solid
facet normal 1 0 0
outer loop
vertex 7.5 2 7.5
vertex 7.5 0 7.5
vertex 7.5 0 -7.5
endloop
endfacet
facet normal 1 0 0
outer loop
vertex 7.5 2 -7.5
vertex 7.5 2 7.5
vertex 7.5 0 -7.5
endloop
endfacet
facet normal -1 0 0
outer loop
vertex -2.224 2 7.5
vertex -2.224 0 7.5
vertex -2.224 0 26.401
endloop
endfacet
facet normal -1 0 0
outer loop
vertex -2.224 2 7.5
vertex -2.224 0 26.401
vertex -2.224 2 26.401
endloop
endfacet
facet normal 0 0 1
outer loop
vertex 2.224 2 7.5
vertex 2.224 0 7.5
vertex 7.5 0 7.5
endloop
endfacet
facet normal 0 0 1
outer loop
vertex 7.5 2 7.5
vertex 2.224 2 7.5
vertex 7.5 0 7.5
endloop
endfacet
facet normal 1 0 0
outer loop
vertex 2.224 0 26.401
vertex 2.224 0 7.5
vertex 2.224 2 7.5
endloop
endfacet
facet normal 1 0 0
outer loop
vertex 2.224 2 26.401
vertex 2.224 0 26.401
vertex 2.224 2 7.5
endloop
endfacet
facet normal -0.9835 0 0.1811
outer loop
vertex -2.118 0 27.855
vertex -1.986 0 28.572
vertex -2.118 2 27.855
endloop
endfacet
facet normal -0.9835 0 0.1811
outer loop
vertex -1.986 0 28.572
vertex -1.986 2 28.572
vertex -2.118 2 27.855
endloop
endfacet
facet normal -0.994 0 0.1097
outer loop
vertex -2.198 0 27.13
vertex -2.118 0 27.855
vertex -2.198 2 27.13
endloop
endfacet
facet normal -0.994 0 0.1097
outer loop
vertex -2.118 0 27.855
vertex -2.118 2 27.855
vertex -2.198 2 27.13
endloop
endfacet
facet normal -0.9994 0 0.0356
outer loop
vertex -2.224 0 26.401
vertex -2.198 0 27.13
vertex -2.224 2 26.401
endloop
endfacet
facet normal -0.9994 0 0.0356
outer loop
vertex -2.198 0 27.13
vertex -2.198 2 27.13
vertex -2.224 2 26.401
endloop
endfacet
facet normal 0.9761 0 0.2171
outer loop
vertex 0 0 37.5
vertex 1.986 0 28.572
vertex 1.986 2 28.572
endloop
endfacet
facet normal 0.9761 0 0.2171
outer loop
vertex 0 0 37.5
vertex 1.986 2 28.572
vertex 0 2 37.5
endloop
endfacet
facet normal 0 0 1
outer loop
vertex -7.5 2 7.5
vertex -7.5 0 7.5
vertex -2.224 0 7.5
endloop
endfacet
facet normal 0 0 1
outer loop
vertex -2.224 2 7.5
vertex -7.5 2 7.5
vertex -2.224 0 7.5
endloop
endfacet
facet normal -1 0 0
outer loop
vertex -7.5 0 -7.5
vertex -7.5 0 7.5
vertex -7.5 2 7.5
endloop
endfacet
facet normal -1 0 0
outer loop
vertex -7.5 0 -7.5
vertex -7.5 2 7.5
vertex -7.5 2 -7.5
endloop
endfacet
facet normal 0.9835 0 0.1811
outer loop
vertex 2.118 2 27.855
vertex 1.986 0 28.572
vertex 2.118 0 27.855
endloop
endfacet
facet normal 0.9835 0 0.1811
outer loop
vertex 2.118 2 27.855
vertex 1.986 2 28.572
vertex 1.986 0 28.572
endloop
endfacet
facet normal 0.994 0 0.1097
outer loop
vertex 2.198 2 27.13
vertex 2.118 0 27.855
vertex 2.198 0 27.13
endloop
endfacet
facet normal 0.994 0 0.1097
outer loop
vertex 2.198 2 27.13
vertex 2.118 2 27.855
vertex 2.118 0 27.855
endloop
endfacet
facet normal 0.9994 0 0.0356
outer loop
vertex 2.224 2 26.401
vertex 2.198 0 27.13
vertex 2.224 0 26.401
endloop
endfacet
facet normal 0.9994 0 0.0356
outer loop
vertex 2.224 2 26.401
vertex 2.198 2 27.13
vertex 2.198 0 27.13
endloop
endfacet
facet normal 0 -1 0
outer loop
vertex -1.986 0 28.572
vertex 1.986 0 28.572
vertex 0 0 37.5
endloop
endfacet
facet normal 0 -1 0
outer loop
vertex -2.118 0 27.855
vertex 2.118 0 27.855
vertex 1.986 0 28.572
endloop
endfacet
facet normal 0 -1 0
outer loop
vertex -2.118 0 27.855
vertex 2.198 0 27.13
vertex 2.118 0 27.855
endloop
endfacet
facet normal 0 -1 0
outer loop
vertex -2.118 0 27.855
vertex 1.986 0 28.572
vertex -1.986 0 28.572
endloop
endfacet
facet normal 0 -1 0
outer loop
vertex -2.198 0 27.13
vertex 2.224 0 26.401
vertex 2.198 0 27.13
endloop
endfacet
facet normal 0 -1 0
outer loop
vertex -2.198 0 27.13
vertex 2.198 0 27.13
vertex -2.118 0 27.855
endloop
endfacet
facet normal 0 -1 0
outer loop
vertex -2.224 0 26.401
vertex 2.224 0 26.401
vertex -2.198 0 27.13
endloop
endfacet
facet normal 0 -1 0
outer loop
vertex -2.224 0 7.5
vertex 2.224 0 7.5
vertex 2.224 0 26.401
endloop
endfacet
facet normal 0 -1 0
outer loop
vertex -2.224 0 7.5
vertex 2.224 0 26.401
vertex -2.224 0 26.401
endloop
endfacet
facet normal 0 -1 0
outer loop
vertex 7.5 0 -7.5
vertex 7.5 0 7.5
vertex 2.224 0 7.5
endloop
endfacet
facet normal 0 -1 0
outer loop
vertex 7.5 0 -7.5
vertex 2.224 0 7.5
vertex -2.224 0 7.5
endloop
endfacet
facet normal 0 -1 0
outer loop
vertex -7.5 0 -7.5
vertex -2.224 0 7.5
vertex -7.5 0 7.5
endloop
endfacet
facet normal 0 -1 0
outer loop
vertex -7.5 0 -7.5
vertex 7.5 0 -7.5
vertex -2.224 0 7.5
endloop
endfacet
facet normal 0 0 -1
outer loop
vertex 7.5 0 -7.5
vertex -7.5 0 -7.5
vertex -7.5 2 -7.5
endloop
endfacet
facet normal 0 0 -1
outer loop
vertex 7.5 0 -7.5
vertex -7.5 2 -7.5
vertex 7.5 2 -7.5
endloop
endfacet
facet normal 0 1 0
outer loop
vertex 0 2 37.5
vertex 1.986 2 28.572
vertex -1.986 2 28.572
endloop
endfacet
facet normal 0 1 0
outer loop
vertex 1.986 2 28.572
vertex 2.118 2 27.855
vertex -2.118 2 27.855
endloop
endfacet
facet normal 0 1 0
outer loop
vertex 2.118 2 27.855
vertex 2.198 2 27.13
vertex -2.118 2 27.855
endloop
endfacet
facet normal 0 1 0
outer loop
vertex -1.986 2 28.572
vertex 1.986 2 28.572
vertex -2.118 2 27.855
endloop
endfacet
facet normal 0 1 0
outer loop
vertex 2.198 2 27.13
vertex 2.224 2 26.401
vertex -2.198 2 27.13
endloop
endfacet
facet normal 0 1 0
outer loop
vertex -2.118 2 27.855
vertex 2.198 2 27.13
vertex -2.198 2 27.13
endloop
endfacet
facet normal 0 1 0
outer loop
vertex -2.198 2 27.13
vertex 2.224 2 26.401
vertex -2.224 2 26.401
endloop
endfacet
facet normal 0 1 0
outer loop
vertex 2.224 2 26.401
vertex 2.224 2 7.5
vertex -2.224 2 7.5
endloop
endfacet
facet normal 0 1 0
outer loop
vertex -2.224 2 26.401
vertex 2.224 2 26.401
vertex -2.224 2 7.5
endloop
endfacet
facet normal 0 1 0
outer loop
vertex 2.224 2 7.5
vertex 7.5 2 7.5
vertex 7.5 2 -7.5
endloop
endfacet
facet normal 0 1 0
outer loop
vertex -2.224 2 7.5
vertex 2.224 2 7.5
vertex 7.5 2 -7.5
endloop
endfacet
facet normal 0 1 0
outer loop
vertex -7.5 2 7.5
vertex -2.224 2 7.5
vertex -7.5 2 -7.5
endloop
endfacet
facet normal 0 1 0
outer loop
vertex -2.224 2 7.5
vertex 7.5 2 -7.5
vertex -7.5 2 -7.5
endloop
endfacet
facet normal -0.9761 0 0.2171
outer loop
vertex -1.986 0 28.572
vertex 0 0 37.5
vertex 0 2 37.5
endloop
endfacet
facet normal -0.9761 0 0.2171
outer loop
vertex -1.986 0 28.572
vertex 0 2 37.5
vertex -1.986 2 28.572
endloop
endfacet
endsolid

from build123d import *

# Parameters (mm, degrees)
IZIM1_W                     = 15
IZIM1_H                     = 15
Y_KSEKLIK_EKSTR_ZYON1_DEPTH = 2
IZIM2_W                     = 2.224225473
IZIM2_H                     = 2
Y_KSEKLIK_EKSTR_ZYON2_DEPTH = 20
Y_KSEKLIK_EKSTR_ZYON3_DEPTH = 2
RADYUS1_R                   = 10
RADYUS2_R                   = 10


with BuildPart() as part:
    # Çizim1 → Yükseklik-Ekstrüzyon1 (new body)
    with BuildSketch(Plane(origin=(0, 0, 0), x_dir=(1, 0, 0), z_dir=(0, 1, 0))):
        Rectangle(IZIM1_W, IZIM1_H)
    extrude(amount=Y_KSEKLIK_EKSTR_ZYON1_DEPTH)

    # Çizim2 → Yükseklik-Ekstrüzyon2 (add)
    with BuildSketch(Plane.XY.offset(7.5)):
        with Locations((1.112112737, 1)):
            Rectangle(IZIM2_W, IZIM2_H)
        with Locations((-1.112112737, 1)):
            Rectangle(IZIM2_W, IZIM2_H)
    extrude(amount=Y_KSEKLIK_EKSTR_ZYON2_DEPTH)

    # Çizim3 → Yükseklik-Ekstrüzyon3 (add)
    with BuildSketch(Plane(origin=(0, 0, 0), x_dir=(1, 0, 0), z_dir=(0, 1, 0))):
        Polygon((-2.224225473, -27.5), (2.224225473, -27.5), (0, -37.5), align=None)
    extrude(amount=Y_KSEKLIK_EKSTR_ZYON3_DEPTH)

    # Radyus1
    radyus1_edges = [part.edges().sort_by_distance(p)[0] for p in [
        (-2.224225473, 1, 27.5),
    ]]
    fillet(radyus1_edges, radius=RADYUS1_R)

    # Radyus2
    radyus2_edges = [part.edges().sort_by_distance(p)[0] for p in [
        (2.224225473, 1, 27.5),
    ]]
    fillet(radyus2_edges, radius=RADYUS2_R)


solid = part.part
